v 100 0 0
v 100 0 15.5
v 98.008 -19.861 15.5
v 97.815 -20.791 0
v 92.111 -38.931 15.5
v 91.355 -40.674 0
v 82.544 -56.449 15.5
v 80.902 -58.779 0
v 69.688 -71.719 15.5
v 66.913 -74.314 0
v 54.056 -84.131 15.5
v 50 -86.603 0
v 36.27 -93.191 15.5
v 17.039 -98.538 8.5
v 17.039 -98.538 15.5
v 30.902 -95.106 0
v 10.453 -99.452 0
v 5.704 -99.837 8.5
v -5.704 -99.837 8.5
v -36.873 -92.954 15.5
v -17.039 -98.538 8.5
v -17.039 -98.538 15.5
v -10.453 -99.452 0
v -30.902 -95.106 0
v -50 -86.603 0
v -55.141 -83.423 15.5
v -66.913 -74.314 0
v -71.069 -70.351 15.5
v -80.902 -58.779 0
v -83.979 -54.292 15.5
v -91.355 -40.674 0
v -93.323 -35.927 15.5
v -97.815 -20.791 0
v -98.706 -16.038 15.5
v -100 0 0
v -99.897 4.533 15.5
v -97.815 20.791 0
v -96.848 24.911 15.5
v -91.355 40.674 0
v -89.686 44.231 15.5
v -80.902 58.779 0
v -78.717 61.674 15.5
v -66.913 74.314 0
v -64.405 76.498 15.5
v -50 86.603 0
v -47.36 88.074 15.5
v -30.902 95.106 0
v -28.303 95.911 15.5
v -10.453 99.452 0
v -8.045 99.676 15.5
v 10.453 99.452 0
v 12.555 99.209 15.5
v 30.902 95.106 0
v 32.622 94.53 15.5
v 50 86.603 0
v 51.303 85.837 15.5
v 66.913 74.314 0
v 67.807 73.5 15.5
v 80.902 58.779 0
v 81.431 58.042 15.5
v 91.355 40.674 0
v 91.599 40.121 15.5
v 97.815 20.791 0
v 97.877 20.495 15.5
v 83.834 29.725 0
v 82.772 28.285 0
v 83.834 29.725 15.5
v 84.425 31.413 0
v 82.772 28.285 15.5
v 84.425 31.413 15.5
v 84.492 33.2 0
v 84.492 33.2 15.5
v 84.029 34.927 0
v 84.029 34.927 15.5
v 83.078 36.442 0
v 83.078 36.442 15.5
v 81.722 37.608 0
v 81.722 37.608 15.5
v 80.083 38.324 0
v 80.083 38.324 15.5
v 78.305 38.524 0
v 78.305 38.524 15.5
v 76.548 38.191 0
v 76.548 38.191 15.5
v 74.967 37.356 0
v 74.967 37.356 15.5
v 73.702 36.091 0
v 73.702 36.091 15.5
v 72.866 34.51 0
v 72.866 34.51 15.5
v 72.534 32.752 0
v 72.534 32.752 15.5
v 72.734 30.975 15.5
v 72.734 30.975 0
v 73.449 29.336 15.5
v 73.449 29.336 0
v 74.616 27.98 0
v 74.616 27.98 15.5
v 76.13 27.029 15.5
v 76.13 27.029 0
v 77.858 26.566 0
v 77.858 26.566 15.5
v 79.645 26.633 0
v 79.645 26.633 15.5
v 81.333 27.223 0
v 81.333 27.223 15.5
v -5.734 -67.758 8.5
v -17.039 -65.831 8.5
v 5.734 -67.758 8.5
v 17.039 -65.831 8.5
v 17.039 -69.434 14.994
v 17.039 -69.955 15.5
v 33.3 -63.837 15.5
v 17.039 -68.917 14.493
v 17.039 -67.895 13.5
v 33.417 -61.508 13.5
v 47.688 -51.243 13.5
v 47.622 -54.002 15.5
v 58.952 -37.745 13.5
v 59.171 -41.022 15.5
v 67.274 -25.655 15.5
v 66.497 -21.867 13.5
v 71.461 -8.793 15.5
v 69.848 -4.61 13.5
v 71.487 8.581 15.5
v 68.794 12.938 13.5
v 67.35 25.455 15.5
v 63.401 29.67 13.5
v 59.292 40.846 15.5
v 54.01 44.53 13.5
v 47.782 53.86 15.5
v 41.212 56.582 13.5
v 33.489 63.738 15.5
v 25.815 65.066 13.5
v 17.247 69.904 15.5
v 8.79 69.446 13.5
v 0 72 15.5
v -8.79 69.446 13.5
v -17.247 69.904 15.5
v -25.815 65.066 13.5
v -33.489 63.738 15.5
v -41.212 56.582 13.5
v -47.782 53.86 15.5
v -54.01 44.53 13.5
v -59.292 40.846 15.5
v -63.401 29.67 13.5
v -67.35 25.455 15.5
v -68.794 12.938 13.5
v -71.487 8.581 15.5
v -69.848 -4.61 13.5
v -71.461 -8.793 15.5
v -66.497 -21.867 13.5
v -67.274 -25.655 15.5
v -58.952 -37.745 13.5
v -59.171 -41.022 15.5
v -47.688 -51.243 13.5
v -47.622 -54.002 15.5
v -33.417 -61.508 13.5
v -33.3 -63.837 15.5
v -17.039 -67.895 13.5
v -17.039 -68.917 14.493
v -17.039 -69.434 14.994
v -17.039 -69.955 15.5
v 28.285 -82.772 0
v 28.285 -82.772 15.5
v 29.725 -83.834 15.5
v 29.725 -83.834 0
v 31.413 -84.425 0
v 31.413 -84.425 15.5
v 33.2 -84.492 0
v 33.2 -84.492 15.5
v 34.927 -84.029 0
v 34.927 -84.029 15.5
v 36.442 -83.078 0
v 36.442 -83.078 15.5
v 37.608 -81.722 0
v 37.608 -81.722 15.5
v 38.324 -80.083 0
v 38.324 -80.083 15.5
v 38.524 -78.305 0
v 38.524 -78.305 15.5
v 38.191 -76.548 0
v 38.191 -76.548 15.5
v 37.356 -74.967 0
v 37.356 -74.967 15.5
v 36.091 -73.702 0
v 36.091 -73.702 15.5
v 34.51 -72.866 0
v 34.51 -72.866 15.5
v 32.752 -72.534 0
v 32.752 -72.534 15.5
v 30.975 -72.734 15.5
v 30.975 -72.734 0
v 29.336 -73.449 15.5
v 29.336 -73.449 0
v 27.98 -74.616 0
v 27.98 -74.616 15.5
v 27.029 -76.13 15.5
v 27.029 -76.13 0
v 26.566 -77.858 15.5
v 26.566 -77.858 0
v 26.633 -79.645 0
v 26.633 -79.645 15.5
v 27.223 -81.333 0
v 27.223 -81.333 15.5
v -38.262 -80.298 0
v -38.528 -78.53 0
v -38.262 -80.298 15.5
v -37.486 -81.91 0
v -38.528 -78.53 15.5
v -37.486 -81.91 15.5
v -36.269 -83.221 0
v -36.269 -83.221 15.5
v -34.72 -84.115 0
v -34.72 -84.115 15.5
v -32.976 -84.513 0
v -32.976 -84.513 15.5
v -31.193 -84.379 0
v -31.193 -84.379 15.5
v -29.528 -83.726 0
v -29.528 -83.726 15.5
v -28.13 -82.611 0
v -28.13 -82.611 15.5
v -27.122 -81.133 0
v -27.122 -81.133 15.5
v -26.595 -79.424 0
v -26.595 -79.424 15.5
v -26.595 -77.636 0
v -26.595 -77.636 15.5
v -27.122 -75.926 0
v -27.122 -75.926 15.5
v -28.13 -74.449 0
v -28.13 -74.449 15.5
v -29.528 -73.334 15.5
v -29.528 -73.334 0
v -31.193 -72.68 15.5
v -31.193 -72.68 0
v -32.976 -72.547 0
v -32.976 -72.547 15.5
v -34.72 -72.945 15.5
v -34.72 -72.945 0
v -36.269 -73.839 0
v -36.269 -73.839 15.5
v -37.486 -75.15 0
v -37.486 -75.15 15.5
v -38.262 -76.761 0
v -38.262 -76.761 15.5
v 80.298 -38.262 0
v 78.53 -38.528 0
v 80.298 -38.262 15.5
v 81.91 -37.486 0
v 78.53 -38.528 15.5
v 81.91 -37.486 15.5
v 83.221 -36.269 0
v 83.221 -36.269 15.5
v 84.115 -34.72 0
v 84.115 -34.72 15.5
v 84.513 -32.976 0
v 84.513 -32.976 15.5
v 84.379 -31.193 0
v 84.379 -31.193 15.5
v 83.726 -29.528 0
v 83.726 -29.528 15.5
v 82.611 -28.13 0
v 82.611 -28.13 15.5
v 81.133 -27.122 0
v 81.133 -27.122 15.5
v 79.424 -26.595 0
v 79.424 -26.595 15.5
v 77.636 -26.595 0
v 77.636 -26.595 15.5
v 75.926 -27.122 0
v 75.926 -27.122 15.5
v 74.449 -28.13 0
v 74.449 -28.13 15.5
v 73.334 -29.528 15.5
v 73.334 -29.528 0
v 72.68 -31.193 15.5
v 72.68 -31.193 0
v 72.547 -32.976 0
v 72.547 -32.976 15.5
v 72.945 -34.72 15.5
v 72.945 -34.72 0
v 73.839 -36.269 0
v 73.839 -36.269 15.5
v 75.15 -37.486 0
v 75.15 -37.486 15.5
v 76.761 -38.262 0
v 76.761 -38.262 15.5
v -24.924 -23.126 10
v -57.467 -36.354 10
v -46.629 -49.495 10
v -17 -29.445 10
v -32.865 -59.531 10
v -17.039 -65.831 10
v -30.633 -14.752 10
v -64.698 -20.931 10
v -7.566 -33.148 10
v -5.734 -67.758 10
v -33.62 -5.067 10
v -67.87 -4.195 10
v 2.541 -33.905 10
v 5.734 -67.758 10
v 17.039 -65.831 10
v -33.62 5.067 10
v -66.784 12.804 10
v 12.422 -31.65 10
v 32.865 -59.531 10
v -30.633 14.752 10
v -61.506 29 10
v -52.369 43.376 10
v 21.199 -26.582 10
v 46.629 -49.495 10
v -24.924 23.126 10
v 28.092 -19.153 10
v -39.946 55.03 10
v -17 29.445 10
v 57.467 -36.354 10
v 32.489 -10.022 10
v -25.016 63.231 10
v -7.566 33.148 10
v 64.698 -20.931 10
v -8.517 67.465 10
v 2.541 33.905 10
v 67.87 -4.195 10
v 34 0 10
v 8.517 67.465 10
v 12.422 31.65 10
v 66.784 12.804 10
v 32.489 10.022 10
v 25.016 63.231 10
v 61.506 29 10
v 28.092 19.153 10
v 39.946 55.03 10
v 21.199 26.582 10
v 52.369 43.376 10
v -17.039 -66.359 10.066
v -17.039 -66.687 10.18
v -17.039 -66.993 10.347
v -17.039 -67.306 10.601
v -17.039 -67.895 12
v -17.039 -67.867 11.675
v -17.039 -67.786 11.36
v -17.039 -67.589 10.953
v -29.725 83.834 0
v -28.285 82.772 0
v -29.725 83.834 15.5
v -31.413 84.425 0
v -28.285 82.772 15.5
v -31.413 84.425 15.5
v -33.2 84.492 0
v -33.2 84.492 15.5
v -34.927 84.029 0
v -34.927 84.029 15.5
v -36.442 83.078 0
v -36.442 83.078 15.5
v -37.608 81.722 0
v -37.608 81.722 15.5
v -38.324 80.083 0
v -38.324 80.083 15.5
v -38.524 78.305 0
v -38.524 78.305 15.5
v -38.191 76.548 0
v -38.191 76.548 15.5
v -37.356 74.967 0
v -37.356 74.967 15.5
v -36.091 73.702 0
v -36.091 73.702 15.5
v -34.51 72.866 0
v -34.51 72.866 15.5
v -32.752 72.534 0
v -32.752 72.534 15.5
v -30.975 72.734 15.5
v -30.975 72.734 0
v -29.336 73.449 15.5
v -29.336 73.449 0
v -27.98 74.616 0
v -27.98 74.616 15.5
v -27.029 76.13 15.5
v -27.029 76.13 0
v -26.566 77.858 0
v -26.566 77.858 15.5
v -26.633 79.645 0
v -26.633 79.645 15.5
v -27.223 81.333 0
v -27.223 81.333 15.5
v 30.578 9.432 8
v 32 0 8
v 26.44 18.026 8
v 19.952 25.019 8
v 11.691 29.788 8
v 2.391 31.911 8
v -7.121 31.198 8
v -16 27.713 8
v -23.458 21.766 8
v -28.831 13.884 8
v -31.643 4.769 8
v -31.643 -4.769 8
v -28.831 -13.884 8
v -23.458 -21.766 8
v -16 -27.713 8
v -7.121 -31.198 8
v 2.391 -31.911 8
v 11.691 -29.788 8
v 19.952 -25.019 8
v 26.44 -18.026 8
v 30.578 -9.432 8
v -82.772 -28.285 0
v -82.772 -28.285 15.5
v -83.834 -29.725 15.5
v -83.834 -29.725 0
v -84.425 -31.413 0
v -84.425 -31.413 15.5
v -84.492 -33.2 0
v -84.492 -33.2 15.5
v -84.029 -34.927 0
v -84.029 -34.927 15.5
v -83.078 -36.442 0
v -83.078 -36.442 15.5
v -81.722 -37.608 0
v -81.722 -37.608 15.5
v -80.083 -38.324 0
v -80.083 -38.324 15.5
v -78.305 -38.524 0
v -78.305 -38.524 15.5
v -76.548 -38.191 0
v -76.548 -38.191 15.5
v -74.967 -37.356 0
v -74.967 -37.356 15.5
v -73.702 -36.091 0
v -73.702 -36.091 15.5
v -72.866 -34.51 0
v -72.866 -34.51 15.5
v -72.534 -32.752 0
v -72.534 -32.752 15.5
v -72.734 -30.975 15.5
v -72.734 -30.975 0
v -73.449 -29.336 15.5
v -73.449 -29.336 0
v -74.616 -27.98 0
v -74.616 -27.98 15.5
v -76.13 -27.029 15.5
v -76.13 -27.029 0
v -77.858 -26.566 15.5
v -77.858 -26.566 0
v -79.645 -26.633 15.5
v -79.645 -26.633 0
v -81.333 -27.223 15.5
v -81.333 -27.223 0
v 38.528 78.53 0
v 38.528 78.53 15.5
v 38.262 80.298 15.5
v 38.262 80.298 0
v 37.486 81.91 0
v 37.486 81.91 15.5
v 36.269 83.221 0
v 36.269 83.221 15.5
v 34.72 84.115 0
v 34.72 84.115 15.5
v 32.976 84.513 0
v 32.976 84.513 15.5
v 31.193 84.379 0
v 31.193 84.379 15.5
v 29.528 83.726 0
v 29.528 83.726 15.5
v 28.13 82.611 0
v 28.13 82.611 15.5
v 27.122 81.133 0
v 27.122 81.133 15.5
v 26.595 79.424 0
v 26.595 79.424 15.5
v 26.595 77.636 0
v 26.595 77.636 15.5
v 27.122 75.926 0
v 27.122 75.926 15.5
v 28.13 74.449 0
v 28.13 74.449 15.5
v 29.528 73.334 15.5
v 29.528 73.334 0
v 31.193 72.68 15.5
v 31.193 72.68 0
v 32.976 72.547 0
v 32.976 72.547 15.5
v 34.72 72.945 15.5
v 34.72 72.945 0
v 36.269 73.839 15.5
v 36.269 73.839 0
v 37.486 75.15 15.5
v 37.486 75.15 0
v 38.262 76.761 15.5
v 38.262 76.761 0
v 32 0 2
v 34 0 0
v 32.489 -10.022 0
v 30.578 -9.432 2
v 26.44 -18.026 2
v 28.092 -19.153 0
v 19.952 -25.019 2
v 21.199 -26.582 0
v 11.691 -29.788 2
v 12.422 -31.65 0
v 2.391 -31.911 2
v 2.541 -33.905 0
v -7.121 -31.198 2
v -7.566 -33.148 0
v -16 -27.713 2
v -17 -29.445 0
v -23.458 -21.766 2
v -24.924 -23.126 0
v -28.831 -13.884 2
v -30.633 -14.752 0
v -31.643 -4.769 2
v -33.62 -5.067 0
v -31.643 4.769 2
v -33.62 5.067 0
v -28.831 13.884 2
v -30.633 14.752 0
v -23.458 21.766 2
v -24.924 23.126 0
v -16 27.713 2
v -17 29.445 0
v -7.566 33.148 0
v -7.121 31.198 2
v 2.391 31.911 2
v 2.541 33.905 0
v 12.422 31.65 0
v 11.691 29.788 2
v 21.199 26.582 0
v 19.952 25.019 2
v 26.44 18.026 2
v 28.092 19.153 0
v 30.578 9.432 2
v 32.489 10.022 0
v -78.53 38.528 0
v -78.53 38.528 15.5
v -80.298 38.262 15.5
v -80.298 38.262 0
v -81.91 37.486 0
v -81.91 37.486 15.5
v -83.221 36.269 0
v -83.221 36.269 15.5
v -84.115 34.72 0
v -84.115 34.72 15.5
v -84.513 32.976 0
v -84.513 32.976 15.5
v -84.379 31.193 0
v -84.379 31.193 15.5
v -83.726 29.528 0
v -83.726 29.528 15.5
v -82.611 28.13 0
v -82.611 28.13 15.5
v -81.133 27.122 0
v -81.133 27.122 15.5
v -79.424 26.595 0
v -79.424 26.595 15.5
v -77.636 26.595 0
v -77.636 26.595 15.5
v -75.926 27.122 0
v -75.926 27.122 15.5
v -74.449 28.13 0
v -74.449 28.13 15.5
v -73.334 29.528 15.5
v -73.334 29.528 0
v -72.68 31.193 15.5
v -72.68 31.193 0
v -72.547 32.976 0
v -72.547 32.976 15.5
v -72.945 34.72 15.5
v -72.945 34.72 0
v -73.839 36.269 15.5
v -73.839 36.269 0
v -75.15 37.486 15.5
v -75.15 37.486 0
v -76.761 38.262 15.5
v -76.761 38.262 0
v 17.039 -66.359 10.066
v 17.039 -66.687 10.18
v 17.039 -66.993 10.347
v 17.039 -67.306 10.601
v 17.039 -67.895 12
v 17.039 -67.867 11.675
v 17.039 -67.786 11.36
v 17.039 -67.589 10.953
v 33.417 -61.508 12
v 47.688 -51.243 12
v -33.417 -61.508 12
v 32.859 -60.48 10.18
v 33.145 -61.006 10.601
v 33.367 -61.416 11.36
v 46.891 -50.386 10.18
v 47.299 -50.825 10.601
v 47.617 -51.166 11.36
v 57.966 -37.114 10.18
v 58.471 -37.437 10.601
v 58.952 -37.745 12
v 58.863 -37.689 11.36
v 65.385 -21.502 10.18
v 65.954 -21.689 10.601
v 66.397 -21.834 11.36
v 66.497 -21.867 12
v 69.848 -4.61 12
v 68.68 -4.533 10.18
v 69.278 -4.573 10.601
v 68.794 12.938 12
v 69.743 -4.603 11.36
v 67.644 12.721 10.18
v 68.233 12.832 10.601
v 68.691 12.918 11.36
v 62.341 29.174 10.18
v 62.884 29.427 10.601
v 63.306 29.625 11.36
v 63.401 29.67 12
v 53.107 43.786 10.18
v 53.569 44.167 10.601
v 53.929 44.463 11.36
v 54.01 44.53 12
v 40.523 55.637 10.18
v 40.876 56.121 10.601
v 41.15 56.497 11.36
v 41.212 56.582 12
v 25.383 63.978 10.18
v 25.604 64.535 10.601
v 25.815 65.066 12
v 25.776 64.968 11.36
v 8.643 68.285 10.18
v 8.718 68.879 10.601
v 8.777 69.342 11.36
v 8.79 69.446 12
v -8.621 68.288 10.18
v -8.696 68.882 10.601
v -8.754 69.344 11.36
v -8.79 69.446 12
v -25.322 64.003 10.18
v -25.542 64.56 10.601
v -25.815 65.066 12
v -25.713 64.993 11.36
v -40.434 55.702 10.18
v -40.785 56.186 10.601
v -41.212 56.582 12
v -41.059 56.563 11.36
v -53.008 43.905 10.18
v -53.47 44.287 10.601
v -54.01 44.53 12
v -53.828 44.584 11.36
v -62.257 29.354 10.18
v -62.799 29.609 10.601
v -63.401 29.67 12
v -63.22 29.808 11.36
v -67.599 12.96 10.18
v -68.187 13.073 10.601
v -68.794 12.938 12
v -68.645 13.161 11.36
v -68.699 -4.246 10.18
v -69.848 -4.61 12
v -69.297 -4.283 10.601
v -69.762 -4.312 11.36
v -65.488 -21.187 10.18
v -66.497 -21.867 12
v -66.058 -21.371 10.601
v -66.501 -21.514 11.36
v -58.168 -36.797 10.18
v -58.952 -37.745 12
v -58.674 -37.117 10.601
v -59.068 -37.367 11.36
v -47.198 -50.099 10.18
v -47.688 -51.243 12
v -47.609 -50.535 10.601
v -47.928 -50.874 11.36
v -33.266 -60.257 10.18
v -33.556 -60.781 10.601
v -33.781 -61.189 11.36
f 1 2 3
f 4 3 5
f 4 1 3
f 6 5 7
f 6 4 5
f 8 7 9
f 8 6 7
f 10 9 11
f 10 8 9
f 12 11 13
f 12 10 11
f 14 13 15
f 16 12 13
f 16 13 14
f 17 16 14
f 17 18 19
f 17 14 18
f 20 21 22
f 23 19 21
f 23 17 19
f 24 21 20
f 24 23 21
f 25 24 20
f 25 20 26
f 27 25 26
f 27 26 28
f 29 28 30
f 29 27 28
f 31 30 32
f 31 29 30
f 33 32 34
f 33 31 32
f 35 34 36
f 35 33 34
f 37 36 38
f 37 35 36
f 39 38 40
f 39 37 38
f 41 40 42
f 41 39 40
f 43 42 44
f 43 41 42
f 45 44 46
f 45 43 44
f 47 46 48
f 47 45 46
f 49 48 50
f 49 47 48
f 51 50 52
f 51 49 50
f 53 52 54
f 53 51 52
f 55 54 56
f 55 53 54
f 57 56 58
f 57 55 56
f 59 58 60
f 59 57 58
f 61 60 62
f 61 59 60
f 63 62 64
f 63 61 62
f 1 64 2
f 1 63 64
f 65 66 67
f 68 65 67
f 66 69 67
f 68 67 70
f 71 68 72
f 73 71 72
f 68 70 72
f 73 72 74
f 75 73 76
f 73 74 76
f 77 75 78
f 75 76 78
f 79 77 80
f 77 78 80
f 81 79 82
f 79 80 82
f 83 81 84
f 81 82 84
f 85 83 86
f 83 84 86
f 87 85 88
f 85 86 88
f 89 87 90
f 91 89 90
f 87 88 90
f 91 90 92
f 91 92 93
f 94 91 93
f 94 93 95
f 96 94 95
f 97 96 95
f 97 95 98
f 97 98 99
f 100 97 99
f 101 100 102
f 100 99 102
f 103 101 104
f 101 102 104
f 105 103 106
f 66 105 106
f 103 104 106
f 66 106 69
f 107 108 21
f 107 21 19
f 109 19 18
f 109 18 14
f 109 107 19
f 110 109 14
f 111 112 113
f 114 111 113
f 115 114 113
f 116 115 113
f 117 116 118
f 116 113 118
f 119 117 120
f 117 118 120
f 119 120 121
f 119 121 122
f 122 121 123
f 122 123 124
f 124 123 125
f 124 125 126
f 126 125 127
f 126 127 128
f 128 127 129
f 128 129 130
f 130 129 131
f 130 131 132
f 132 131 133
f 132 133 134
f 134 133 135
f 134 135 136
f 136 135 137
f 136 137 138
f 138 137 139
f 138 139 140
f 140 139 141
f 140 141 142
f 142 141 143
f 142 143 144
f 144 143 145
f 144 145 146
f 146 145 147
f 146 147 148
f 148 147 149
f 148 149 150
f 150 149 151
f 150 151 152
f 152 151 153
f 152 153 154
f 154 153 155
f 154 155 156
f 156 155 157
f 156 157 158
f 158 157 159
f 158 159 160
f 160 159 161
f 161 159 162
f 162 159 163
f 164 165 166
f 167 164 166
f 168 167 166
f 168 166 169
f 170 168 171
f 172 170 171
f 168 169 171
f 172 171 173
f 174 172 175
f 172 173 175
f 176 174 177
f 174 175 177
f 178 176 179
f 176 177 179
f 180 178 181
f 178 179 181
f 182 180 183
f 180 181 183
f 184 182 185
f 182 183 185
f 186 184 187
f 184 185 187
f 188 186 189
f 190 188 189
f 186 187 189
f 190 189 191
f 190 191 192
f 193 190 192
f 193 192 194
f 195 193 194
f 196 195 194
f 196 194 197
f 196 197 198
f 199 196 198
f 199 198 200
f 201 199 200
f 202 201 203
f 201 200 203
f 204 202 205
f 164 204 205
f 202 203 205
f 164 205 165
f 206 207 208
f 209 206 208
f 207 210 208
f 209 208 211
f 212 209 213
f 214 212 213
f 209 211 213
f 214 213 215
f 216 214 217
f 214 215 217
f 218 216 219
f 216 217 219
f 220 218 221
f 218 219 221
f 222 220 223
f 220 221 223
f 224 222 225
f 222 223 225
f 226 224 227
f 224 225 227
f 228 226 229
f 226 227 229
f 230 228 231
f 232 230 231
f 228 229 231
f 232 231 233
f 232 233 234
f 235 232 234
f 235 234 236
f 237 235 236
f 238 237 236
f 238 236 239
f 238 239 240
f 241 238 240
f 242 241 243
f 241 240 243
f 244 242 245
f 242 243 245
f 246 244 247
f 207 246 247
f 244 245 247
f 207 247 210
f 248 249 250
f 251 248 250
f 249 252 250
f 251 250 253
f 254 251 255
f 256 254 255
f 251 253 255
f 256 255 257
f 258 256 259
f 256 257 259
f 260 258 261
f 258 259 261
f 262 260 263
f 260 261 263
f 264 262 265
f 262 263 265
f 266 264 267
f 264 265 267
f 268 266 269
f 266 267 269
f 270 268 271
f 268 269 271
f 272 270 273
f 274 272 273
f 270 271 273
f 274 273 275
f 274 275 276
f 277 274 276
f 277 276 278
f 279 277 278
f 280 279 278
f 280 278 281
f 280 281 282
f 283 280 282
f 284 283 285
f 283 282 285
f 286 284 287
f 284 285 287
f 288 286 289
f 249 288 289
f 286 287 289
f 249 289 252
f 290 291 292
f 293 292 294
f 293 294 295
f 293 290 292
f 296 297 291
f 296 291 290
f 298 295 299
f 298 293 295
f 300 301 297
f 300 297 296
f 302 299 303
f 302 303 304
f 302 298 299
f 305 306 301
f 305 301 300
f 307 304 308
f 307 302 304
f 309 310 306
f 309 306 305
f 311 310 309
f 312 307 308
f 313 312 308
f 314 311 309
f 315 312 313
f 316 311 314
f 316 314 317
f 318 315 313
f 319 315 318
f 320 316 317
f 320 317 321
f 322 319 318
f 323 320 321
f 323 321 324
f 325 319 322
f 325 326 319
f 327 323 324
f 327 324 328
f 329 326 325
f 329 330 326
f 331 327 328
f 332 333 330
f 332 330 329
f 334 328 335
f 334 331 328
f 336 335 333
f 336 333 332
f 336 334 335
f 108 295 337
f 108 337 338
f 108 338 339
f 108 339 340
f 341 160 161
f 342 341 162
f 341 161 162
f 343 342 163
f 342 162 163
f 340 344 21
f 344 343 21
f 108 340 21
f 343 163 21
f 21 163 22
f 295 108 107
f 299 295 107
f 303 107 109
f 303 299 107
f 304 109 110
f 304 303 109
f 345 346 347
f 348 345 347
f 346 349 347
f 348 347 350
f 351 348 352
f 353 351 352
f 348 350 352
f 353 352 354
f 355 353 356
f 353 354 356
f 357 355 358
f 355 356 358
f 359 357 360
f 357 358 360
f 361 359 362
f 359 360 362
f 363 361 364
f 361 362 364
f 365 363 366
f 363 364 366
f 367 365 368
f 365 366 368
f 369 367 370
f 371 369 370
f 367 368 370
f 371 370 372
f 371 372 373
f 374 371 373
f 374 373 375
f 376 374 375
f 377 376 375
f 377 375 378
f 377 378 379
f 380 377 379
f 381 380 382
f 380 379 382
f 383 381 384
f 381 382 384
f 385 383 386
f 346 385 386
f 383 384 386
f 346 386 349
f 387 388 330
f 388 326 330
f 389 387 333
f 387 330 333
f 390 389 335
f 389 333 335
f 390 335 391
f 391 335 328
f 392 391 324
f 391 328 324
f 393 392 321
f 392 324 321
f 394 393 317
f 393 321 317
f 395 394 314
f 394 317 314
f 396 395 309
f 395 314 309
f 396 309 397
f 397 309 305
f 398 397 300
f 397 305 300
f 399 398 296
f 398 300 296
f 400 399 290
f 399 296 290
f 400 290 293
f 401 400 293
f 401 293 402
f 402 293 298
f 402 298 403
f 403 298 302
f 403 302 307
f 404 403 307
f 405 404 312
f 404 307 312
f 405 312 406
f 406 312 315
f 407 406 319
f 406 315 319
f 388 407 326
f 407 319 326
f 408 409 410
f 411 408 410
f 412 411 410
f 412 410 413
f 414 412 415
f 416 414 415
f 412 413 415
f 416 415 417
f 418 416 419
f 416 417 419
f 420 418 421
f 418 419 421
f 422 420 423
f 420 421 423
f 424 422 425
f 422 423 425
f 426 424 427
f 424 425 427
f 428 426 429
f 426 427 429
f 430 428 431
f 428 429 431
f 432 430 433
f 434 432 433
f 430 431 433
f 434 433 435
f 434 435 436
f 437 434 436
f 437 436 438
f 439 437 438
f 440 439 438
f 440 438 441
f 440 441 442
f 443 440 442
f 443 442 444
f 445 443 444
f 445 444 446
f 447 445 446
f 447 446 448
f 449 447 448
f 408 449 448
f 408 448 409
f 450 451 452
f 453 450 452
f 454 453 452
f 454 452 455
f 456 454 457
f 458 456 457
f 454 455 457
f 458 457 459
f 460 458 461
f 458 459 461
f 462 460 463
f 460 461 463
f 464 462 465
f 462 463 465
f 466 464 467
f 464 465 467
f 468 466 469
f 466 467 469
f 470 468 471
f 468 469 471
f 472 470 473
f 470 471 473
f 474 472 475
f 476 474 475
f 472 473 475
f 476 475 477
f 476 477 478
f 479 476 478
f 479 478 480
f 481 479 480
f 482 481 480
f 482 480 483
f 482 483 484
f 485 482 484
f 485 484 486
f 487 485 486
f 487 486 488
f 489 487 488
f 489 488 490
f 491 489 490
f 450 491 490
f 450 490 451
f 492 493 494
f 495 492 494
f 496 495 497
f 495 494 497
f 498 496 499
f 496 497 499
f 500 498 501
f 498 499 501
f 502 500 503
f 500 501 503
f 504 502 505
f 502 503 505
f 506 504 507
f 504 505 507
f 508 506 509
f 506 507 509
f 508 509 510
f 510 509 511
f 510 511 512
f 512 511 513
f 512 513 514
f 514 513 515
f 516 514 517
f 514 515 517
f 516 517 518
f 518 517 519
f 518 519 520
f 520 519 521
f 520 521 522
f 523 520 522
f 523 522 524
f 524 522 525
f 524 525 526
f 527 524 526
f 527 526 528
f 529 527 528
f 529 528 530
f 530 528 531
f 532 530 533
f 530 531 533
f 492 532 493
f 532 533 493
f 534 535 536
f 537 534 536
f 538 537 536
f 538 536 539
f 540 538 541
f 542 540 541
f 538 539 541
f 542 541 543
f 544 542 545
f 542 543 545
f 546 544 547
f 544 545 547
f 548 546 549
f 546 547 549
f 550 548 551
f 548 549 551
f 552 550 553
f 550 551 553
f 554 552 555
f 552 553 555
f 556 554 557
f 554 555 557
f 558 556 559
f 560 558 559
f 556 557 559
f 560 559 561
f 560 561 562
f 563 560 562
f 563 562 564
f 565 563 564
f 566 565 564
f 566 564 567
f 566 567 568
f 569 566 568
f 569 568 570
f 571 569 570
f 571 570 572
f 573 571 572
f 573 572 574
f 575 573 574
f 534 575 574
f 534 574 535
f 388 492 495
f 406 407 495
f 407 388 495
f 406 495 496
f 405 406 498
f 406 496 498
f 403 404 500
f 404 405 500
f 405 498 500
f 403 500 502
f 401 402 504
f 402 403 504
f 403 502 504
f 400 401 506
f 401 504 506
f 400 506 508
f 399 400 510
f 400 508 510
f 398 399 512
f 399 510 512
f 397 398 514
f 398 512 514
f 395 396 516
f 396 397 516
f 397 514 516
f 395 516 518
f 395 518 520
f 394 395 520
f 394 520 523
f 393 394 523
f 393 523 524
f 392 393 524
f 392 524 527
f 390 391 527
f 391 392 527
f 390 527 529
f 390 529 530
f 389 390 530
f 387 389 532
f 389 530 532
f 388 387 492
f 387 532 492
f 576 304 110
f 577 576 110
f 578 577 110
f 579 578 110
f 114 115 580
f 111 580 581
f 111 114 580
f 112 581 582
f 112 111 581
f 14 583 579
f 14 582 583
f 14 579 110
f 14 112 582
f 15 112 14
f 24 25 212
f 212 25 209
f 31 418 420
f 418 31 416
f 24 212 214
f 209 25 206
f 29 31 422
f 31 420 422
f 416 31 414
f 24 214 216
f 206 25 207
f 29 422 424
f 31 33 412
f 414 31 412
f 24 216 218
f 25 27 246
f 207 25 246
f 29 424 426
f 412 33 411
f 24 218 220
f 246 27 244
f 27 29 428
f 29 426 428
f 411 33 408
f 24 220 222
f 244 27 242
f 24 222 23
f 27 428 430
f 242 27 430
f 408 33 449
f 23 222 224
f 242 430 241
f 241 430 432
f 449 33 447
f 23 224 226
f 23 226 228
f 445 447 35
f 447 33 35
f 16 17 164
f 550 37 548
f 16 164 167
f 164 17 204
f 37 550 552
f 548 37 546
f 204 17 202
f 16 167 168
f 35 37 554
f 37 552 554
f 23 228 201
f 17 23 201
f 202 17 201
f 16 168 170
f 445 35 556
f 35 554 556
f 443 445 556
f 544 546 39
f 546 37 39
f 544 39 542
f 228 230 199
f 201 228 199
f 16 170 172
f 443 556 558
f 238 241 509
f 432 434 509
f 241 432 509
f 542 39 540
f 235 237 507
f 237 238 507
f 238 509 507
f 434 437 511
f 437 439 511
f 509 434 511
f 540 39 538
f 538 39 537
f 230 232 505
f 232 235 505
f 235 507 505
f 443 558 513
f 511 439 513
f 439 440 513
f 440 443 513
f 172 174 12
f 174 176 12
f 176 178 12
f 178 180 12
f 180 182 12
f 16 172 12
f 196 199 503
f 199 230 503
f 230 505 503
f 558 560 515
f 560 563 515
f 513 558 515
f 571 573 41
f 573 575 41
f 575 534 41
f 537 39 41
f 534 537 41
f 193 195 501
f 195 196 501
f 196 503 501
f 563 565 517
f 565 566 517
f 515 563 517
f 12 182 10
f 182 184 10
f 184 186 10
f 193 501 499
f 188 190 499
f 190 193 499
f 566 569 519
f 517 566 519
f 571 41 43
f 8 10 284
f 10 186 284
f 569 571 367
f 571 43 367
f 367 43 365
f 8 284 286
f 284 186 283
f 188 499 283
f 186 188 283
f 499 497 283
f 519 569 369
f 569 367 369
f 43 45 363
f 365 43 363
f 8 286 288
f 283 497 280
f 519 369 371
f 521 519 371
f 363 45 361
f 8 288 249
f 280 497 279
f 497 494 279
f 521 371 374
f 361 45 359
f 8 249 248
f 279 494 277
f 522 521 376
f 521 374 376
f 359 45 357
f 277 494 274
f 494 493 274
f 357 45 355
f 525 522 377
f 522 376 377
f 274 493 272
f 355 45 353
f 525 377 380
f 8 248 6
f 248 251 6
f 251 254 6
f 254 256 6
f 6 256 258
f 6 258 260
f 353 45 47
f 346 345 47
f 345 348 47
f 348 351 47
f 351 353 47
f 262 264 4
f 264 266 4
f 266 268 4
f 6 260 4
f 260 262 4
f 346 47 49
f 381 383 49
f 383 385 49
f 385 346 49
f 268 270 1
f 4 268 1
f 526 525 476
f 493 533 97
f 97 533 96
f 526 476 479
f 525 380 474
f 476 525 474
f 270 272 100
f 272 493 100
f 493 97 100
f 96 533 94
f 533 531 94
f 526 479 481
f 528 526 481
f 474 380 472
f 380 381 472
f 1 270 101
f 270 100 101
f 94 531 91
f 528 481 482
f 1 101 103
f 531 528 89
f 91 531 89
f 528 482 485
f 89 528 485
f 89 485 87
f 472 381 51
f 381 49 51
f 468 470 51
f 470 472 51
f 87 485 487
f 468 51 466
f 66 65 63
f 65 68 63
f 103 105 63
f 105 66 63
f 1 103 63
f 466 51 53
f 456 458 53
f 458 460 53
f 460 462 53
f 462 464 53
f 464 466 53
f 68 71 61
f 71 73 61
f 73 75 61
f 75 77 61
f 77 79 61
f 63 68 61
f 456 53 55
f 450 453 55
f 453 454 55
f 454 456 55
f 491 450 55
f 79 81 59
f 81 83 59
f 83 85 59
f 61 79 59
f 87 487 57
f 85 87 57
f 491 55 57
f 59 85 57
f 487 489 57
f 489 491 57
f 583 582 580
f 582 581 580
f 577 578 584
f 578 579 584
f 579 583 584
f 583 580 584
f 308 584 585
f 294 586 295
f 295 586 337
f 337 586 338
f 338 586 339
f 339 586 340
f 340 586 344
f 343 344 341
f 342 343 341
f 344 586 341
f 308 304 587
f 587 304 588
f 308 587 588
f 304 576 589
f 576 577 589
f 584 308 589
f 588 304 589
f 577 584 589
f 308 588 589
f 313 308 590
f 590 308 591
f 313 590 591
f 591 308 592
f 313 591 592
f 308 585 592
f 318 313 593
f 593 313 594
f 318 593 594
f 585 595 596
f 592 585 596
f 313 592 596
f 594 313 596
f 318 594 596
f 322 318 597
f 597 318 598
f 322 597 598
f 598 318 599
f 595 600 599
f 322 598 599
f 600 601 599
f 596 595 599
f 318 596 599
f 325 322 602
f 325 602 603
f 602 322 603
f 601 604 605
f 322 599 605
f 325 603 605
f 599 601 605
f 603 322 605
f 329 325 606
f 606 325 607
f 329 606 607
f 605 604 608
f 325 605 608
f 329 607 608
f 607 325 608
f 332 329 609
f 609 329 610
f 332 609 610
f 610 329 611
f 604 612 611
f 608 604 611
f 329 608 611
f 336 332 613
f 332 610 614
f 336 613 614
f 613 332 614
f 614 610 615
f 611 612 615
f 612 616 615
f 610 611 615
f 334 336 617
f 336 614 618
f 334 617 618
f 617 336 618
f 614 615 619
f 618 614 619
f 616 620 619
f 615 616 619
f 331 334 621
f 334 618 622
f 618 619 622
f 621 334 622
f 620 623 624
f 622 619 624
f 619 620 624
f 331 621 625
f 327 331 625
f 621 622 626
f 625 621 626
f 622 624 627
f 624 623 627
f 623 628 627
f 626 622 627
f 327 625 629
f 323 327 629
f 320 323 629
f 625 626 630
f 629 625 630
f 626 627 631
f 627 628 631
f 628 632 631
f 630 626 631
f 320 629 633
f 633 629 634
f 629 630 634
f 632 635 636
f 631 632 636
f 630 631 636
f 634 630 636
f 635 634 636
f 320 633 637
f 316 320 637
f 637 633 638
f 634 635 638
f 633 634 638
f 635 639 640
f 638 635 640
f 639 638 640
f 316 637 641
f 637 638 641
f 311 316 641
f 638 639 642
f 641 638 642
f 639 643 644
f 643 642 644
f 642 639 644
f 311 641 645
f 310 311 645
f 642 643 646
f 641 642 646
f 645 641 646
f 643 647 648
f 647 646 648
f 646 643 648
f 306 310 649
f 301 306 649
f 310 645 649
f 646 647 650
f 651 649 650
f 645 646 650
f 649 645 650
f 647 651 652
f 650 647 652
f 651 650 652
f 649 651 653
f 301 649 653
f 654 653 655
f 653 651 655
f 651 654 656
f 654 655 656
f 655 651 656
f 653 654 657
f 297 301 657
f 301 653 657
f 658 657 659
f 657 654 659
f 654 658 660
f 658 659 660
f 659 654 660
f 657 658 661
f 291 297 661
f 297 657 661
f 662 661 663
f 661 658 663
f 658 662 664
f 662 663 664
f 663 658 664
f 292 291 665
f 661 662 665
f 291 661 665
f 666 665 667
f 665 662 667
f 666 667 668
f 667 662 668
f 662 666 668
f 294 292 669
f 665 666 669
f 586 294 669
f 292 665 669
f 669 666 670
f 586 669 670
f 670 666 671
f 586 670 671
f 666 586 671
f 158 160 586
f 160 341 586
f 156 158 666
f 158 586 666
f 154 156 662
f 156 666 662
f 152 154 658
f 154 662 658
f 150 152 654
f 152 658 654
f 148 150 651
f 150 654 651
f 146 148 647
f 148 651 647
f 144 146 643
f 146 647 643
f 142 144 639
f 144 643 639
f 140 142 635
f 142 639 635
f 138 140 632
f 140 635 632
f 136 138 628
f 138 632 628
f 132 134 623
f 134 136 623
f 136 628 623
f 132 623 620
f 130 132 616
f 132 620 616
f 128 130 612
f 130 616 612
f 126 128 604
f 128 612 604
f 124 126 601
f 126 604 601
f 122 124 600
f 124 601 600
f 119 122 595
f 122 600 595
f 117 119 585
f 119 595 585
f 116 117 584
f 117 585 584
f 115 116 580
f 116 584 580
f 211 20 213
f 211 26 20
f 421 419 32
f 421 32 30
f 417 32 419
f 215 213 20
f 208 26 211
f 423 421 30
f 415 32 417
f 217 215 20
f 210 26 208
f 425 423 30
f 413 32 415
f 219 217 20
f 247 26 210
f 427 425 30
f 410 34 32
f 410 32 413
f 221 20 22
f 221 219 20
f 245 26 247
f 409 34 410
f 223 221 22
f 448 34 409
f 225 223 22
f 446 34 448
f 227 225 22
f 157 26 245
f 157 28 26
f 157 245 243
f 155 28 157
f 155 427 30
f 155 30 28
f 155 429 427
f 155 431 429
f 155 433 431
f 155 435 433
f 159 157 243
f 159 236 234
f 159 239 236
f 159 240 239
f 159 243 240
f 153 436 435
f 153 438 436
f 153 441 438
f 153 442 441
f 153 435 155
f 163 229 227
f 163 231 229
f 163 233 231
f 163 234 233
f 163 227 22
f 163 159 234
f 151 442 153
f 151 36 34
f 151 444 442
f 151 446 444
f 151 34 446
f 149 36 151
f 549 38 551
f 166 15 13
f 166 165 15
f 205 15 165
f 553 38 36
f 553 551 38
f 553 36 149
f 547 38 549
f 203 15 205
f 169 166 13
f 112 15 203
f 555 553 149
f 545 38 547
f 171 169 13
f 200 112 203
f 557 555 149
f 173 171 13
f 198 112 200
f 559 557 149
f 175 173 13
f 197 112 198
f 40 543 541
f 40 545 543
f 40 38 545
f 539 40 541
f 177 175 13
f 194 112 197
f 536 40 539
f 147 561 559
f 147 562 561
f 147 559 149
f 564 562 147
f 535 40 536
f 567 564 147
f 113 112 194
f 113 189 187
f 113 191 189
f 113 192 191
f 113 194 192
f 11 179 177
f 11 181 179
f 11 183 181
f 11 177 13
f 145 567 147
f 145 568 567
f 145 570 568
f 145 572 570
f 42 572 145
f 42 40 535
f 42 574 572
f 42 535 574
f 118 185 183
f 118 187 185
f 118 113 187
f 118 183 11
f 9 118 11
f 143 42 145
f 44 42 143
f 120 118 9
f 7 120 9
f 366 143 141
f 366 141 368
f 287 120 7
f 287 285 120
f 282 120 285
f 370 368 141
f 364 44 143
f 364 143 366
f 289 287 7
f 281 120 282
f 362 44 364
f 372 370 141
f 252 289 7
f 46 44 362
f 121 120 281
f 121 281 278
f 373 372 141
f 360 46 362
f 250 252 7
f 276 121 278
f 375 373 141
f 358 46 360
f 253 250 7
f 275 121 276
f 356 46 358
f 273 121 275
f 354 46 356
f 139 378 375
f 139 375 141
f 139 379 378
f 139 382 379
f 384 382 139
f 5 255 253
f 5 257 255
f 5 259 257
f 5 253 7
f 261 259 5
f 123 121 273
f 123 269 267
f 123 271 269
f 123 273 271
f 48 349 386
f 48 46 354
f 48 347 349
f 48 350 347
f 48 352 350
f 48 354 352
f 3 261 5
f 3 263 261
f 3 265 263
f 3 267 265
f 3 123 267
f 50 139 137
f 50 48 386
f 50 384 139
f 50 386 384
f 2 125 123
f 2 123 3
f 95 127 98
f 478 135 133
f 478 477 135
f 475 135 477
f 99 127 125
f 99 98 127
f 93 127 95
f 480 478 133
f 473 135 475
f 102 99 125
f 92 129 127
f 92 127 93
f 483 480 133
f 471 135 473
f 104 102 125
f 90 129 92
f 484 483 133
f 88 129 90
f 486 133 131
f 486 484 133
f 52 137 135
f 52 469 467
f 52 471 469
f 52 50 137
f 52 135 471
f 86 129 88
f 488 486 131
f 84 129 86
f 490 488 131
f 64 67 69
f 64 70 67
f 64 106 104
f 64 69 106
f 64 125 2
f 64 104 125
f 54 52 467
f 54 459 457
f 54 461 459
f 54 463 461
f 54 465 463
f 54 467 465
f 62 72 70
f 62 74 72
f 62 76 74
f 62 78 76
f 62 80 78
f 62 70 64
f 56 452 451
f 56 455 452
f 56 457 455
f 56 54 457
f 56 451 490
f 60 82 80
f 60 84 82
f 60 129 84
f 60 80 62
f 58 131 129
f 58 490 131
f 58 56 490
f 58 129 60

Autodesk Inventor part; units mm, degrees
ref_plane "YZ Plane" through (0, 0, 0) normal (1, 0, 0) x (0, 1, 0)
ref_plane "XZ Plane" through (0, 0, 0) normal (0, 1, 0) x (-1, 0, 0)
ref_plane "XY Plane" through (0, 0, 0) normal (0, 0, 1) x (1, 0, 0)
sketch "Эскиз1" plane through (0, 0, 0) normal (0, 0, 1) x (1, 0, 0)
  circle A0 centre (0, 0) radius 32
  circle A1 centre (0, 0) radius 100
  dimension "d0" = 64
  dimension "d1" = 200
extrude "Выдавливание1" add sketch "Эскиз1" along normal blind 10
sketch "Эскиз2" plane through (0, 0, 10) normal (0, 0, 1) x (1, 0, 0)
  circle A0 centre (0, 0) radius 100 projected
  circle A1 centre (0, 0) radius 70
  dimension "d4" = 140
extrude "Выдавливание2" add sketch "Эскиз2" along normal blind 5.5
sketch "Эскиз3" plane through (0, 0, 0) normal (0, 0, -1) x (-1, 0, 0)
  line L0 (0, 0) -> (78.5298, 32.5281)
  line L1 (140, 0) -> (-140, 0) projected
  dimension "d8" = 85
  dimension "d9" = 22.5
hole "Отверстие1" at (-78.5298, 32.5281, 0) direction (0, 0, 1) diameter 12 end through all
pattern_circular "Круговой массив1" count 8 over 360 about axis through (0, 0, 0) along (0, 0, 1) of "Отверстие1"
chamfer "Фаска1" distance 2 angle 45 3 edges at (-32, 0, 0) (-32, 0, 10) (-70, 0, 15.5)
fillet "Сопряжение1" radius 2 1 edges at (-70, 0, 10)
sketch "Эскиз4" plane through (0, 0, 15.5) normal (0, 0, 1) x (1, 0, 0)
  circle A0 centre (0, 0) radius 72 projected
  circle A1 centre (0, 0) radius 100 projected
  line L0 (17.039, -69.9548) -> (17.039, -98.5377)
  circle A2 centre (0, 0) radius 100 projected
  line L1 (0, -140) -> (0, 140) projected
  line L2 (-17.039, -69.9548) -> (-17.039, -98.5377)
  line L3 (-17.039, -69.9548) -> (-17.039, -65.8306)
  circle A3 centre (0, 0) radius 68 projected
  line L4 (17.039, -69.9548) -> (17.039, -65.8306)
extrude "Выдавливание3" cut sketch "Эскиз4" against normal blind 7 contours L0 A1 L1 A0 | A0 L1 A3 L4 | L1 A1 L2 A0 | A0 L3 A3 L1 picked at (9.5127, -80.7365) picked at (15.1684, -67.6061) picked at (-9.5127, -80.7365) picked at (-15.1684, -67.6061)
properties part number "Крышка перегородки22" material "Чугун, серый"
